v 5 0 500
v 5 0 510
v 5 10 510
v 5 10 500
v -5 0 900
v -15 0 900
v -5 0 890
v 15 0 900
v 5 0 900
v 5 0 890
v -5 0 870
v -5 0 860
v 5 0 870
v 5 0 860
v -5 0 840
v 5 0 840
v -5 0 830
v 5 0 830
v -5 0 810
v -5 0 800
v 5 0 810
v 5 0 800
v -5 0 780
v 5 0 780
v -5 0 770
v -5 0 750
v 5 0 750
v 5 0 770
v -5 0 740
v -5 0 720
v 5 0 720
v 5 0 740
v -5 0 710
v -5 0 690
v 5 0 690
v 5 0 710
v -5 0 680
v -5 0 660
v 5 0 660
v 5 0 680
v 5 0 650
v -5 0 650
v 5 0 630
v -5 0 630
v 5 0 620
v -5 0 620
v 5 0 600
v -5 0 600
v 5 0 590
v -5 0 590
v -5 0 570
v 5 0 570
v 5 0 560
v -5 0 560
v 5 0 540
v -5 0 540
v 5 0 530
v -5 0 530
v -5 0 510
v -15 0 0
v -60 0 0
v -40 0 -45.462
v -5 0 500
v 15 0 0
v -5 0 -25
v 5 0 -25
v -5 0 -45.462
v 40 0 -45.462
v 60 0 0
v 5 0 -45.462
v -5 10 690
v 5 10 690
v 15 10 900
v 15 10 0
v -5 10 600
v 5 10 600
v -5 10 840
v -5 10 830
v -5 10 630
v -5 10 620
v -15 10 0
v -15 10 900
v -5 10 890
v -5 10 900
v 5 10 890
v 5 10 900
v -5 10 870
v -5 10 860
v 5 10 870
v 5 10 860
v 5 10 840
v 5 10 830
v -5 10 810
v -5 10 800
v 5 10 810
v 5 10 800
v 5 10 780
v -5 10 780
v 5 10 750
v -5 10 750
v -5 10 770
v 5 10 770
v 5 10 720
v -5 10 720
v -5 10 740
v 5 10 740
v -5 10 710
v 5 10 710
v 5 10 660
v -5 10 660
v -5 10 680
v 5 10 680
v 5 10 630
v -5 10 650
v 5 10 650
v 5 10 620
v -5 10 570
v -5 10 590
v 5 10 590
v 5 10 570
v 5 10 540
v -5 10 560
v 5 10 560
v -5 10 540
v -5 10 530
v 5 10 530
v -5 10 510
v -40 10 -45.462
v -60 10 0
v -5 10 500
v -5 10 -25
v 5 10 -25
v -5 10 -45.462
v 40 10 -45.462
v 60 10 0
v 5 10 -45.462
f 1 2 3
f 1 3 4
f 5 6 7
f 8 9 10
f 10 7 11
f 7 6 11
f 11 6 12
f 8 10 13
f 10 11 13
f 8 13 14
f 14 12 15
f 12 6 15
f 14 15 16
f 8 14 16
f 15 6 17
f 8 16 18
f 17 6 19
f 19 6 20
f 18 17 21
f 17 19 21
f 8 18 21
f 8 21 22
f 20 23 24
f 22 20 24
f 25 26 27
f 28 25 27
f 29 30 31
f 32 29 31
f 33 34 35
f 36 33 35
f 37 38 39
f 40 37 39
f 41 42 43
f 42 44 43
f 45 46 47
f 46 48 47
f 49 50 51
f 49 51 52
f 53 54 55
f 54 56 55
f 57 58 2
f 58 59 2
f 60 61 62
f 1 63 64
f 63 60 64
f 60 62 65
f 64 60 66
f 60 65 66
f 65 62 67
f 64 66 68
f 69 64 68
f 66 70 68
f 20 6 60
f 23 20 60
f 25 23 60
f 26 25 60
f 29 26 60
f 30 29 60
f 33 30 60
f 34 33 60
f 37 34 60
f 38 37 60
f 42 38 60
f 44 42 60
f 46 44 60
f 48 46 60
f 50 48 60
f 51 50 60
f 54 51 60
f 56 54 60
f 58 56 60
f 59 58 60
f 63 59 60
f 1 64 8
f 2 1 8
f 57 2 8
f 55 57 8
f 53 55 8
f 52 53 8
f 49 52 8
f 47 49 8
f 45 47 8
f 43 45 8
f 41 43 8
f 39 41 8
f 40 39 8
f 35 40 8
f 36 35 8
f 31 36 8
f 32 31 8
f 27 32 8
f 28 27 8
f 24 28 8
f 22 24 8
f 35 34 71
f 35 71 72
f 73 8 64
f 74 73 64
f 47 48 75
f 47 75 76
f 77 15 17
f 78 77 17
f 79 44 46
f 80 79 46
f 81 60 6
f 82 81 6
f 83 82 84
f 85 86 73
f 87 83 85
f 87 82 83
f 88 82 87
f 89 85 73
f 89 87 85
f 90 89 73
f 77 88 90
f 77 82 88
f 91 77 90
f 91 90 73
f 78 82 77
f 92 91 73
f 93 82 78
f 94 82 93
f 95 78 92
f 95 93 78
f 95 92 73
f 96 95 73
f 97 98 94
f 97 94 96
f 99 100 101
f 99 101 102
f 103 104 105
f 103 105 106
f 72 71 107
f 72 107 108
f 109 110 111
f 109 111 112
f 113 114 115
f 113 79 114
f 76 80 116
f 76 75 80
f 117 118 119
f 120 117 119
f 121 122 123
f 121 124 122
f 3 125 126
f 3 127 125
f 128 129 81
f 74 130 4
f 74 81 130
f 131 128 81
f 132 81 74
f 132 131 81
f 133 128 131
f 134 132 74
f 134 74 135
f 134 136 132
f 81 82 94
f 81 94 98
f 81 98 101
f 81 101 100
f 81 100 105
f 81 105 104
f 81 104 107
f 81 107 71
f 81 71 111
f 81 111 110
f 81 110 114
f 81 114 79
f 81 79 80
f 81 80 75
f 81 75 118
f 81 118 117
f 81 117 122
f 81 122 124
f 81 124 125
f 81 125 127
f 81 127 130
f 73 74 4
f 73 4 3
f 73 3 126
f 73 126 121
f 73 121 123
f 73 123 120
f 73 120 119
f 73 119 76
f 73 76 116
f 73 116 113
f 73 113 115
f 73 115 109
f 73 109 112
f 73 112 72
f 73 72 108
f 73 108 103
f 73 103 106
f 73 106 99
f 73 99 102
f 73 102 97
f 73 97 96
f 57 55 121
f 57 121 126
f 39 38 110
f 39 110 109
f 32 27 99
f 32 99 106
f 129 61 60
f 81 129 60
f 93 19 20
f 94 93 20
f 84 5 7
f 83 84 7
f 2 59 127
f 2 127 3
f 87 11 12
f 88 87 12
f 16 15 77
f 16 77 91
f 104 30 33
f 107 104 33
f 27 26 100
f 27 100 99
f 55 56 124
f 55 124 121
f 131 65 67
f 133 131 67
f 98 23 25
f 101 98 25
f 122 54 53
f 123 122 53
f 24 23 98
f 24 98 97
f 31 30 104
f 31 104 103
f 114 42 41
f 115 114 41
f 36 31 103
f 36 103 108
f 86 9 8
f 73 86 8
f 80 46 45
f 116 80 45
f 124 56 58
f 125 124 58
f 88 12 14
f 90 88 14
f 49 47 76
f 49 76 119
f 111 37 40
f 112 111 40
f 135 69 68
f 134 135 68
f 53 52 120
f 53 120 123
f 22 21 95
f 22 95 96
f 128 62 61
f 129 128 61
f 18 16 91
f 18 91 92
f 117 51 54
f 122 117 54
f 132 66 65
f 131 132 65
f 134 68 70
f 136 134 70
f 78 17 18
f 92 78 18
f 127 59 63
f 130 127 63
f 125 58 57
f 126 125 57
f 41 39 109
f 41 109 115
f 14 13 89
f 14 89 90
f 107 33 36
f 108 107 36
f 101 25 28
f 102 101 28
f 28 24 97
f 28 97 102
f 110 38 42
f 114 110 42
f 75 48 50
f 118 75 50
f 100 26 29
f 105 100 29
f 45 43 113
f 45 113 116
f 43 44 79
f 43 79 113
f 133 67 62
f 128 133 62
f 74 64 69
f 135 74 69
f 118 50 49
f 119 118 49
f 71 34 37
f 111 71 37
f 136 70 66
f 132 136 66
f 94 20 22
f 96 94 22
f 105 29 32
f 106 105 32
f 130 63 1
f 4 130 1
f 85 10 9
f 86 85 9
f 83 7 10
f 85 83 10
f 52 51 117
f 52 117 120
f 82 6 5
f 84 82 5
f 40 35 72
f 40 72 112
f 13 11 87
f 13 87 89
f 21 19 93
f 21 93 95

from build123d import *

# Parameters (mm, degrees)
SKETCH_1_W      = 10
SKETCH_1_H      = 10
EXTRUDE_1_DEPTH = 10


with BuildPart() as part:
    # Эскиз1 → Бобышка-Вытянуть1 (new body)
    with BuildSketch(Plane(origin=(0, 0, 0), x_dir=(1, 0, 0), z_dir=(0, 1, 0))):
        Polygon((-60, 0), (-15, 0), (-15, -900), (-5, -900), (-5, -890), (5, -890), (5, -900), (15, -900), (15, 0), (60, 0), (40, 45.461538462), (5, 45.461538462), (5, 25), (-5, 25), (-5, 45.461538462), (-40, 45.461538462), align=None)
        with Locations((0, -865)):
            Rectangle(SKETCH_1_W, SKETCH_1_H, mode=Mode.SUBTRACT)
        with Locations((0, -835)):
            Rectangle(SKETCH_1_W, SKETCH_1_H, mode=Mode.SUBTRACT)
        with Locations((0, -805)):
            Rectangle(SKETCH_1_W, SKETCH_1_H, mode=Mode.SUBTRACT)
        with Locations((0, -775)):
            Rectangle(SKETCH_1_W, SKETCH_1_H, mode=Mode.SUBTRACT)
        with Locations((0, -745)):
            Rectangle(SKETCH_1_W, SKETCH_1_H, mode=Mode.SUBTRACT)
        with Locations((0, -715)):
            Rectangle(SKETCH_1_W, SKETCH_1_H, mode=Mode.SUBTRACT)
        with Locations((0, -685)):
            Rectangle(SKETCH_1_W, SKETCH_1_H, mode=Mode.SUBTRACT)
        with Locations((0, -655)):
            Rectangle(SKETCH_1_W, SKETCH_1_H, mode=Mode.SUBTRACT)
        with Locations((0, -625)):
            Rectangle(SKETCH_1_W, SKETCH_1_H, mode=Mode.SUBTRACT)
        with Locations((0, -595)):
            Rectangle(SKETCH_1_W, SKETCH_1_H, mode=Mode.SUBTRACT)
        with Locations((0, -565)):
            Rectangle(SKETCH_1_W, SKETCH_1_H, mode=Mode.SUBTRACT)
        with Locations((0, -535)):
            Rectangle(SKETCH_1_W, SKETCH_1_H, mode=Mode.SUBTRACT)
        with Locations((0, -505)):
            Rectangle(SKETCH_1_W, SKETCH_1_H, mode=Mode.SUBTRACT)
    extrude(amount=EXTRUDE_1_DEPTH)


solid = part.part
